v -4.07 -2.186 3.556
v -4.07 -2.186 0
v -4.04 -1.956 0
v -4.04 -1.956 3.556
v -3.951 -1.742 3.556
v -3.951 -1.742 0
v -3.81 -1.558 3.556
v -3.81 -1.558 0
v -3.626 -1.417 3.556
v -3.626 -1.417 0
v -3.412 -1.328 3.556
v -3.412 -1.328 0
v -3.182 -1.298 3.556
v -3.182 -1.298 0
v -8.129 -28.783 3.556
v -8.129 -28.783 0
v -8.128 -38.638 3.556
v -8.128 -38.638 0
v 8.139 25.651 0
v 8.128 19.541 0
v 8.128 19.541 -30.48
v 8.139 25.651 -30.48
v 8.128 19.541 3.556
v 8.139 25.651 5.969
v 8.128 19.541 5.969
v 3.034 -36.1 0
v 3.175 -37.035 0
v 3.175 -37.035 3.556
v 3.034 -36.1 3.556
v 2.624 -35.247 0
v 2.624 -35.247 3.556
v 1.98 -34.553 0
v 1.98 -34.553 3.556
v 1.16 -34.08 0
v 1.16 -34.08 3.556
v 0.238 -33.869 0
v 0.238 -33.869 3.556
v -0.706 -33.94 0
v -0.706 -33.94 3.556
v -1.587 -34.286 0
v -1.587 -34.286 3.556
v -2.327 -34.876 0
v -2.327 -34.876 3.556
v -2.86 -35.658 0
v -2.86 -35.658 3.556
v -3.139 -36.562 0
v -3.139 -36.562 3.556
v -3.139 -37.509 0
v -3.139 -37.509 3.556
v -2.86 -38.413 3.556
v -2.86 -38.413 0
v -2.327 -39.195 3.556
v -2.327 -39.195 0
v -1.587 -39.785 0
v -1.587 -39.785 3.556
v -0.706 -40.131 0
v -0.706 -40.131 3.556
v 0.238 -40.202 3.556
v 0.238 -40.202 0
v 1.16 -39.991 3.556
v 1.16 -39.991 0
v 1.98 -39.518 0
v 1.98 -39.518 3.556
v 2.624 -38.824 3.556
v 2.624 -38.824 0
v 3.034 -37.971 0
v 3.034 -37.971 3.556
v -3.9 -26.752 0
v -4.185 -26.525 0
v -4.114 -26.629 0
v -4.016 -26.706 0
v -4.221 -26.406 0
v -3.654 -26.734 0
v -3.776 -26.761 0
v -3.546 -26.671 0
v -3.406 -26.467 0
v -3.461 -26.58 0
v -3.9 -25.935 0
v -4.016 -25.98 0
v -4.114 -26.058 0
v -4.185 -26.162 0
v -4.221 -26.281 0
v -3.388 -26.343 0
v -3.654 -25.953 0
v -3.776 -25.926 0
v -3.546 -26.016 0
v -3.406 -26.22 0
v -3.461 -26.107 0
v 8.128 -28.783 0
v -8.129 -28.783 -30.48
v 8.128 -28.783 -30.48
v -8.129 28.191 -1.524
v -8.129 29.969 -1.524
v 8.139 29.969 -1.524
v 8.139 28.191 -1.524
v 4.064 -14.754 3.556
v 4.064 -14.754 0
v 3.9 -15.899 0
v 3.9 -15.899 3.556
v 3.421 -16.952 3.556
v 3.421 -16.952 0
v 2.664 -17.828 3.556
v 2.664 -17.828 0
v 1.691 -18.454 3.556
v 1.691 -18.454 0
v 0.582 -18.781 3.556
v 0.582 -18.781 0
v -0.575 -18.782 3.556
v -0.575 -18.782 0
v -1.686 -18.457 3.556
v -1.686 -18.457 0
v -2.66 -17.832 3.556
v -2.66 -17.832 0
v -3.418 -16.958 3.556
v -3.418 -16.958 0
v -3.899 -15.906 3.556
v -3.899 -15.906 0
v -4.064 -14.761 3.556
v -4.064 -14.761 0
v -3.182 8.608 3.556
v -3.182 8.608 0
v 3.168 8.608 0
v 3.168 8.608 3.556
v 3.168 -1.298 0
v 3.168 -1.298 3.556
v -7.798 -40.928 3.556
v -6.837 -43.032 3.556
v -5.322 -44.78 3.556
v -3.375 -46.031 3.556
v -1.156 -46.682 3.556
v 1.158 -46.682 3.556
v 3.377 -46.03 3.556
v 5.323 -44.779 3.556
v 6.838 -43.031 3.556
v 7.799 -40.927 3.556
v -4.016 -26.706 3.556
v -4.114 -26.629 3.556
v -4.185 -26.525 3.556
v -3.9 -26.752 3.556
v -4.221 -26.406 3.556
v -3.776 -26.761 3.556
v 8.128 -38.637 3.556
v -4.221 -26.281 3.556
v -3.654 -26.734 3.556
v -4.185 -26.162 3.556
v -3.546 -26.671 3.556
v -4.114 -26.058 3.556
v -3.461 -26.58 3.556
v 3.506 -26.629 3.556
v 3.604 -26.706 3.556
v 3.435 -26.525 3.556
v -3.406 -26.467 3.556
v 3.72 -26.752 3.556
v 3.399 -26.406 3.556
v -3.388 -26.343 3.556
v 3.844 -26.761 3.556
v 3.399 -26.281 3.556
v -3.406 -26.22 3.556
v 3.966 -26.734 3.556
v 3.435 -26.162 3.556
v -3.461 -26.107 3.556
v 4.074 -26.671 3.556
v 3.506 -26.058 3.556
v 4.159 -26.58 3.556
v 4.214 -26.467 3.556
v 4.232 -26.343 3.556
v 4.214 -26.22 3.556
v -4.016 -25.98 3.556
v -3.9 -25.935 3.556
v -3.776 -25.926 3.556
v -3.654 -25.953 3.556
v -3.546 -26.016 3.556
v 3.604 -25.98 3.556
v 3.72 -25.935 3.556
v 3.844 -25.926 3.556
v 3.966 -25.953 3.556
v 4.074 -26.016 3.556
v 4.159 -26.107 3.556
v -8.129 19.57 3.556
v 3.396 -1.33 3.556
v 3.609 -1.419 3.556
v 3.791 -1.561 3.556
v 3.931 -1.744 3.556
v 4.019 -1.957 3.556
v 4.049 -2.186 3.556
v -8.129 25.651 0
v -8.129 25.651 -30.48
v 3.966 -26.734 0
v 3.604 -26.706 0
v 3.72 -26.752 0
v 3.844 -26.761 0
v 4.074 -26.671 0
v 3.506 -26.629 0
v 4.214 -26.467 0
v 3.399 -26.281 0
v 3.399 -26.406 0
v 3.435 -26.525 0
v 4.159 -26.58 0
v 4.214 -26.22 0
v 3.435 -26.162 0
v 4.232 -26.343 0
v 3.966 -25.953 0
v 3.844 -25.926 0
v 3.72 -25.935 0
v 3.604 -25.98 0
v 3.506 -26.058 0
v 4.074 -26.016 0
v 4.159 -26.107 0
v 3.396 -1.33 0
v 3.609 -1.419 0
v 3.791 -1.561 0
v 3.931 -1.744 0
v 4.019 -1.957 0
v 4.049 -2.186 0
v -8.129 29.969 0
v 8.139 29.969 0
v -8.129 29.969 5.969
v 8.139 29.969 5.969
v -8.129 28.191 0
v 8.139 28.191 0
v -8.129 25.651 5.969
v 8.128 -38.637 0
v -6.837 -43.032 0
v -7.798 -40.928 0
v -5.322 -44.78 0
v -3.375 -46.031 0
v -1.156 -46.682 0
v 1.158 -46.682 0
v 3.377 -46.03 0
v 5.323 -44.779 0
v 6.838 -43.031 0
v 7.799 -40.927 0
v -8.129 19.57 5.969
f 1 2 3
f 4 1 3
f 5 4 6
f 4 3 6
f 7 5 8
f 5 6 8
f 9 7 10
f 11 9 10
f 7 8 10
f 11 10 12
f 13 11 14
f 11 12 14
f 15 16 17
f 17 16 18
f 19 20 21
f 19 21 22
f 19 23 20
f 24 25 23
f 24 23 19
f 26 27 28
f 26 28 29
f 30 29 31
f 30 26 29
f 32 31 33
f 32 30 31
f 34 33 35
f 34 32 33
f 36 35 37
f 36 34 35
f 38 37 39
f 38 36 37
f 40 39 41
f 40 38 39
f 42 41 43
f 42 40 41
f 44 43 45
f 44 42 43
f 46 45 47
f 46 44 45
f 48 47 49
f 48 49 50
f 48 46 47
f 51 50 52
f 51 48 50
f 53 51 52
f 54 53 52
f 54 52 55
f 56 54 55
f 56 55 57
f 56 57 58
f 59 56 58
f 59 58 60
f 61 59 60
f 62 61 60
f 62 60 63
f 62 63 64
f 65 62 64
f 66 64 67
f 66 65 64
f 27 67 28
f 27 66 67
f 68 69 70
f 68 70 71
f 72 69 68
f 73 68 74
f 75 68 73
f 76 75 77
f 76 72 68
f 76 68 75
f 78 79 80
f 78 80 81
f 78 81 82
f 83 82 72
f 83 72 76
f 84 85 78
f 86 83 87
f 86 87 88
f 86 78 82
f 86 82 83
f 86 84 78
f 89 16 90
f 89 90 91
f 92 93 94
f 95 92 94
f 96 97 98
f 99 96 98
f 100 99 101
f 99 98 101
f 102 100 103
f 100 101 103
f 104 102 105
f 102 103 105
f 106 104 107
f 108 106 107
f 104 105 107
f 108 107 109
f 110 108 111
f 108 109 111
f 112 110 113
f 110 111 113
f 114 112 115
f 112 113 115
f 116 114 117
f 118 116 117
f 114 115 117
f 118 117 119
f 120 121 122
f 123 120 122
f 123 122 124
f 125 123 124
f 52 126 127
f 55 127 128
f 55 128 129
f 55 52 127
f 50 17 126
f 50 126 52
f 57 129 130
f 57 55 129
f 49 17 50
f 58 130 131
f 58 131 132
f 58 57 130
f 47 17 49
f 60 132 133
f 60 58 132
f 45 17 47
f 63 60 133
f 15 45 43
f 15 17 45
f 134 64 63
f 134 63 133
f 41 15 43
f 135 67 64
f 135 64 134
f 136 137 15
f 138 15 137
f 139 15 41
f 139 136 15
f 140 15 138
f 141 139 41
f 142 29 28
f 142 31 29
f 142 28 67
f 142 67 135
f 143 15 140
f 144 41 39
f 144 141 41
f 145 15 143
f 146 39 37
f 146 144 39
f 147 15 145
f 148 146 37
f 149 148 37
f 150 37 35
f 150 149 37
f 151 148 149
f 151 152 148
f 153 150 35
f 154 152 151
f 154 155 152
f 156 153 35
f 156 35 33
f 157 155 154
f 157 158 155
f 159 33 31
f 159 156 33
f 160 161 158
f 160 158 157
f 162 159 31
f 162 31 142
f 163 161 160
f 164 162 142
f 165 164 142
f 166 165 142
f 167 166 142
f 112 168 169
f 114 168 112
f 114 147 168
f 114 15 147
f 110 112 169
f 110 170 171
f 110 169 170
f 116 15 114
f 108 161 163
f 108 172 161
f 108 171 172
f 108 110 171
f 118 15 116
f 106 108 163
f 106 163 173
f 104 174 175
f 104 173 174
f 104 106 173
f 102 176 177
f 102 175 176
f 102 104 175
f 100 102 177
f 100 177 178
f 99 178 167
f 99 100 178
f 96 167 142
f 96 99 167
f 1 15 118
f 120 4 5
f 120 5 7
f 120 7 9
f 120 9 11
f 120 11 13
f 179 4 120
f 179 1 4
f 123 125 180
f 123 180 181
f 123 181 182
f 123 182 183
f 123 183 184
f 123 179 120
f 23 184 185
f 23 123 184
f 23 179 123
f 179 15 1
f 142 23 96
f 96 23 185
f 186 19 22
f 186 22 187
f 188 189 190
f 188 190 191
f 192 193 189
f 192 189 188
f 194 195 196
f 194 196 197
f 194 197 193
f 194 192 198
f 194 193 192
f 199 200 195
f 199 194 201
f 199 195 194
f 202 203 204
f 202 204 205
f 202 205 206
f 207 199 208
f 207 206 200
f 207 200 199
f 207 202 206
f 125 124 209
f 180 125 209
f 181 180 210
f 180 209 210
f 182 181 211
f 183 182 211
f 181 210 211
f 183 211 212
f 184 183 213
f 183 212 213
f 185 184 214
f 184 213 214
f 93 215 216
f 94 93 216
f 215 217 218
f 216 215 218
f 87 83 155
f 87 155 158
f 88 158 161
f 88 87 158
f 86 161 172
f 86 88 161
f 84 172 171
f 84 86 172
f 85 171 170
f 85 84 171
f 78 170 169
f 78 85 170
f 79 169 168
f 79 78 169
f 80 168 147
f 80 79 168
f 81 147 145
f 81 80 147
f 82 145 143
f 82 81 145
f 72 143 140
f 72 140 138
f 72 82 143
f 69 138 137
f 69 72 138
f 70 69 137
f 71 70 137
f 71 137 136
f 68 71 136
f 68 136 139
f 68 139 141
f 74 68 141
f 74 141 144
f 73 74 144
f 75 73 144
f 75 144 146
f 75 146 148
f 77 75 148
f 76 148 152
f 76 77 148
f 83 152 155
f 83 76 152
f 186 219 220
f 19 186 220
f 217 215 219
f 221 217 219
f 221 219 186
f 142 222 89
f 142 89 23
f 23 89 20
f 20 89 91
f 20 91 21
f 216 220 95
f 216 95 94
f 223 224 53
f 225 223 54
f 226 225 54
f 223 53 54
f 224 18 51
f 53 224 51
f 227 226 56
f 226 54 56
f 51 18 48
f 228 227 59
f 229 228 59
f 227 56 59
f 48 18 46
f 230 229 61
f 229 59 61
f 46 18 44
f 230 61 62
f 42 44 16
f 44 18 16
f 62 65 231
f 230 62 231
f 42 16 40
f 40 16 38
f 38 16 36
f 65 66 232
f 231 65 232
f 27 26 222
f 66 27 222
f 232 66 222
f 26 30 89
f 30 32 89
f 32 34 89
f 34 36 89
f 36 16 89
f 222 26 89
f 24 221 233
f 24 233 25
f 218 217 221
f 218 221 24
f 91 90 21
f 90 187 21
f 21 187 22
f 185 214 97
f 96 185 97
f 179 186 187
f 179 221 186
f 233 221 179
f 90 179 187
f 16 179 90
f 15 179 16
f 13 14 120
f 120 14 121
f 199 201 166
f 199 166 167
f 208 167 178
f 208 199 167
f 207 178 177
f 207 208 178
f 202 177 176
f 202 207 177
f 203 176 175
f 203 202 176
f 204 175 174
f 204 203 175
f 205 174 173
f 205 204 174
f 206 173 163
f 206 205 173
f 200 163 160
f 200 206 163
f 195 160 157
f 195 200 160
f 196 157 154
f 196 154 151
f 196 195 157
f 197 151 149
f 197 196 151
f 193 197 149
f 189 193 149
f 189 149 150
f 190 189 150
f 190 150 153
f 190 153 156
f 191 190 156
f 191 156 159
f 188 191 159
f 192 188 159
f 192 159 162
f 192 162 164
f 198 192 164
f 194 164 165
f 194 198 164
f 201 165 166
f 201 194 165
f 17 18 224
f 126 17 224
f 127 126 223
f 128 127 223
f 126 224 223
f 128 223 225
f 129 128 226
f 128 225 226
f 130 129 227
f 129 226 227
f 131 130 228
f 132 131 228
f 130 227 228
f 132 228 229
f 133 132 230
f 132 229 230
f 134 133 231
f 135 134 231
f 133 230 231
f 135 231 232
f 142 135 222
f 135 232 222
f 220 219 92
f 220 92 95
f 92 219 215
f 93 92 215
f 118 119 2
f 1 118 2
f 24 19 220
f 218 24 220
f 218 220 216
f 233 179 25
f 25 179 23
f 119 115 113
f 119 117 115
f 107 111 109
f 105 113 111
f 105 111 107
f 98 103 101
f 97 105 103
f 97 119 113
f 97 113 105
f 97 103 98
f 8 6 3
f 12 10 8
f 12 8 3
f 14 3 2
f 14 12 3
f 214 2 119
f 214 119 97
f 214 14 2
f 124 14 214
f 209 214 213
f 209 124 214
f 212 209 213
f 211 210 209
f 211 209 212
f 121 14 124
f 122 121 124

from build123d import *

# Parameters (mm, degrees)
F0_R     = 0.4191
F0_R_2   = 3.175
F1_DEPTH = 3.556
F0_W     = 16.2684546465
F0_H     = 2.54
F0_H_2   = 1.778
F2_DEPTH = 5.969
F3_DEPTH = 1.524
F4_DEPTH = 30.48


with BuildPart() as f1:
    # F0 (on Top) → F1 (new body)
    with BuildSketch(Plane.XY):
        Polygon((-8.1289618026, 19.5699129487), (-8.1289618026, -28.7827895308), (8.1284994147, -28.7827895308), (8.1284994147, 19.5406646823), align=None)
        with Locations((-3.8069129527, -26.3434465483)):
            Circle(F0_R, mode=Mode.SUBTRACT)
        with Locations((3.8130870473, -26.3434465483)):
            Circle(F0_R, mode=Mode.SUBTRACT)
        with BuildLine():
            ThreePointArc((4.0638460346, -14.7540253319), (0.0030865228, -18.8226827446), (-4.0641509764, -14.7605010551))
            Line((-4.0641509764, -14.7605010551), (-4.069773258, -2.185850306))
            ThreePointArc((-4.069773258, -2.185850306), (-3.8099907741, -1.5581196008), (-3.1823557791, -1.2981059663))
            Line((-3.1823557791, -1.2981059663), (-3.1823557791, 8.6078940337))
            Line((-3.1823557791, 8.6078940337), (3.1676447176, 8.6078940337))
            Line((3.1676447176, 8.6078940337), (3.1676447176, -1.2981059659))
            ThreePointArc((3.1676447176, -1.2981059659), (3.7912426345, -1.5606685465), (4.0494391018, -2.1860868505))
            Line((4.0494391018, -2.1860868505), (4.0638460346, -14.7540253319))
        make_face(mode=Mode.SUBTRACT)
        with BuildLine():
            Line((-8.1289618026, -28.7827895308), (-8.1275002277, -38.637912922))
            ThreePointArc((-8.1275002501, -38.637912922), (0.0011022648, -46.764707356), (8.1284994371, -38.6367074901))
            Line((8.1284994147, -38.6367074901), (8.1284994147, -28.7827895308))
            Line((8.1284994147, -28.7827895308), (-8.1289618026, -28.7827895308))
        make_face()
        with Locations((0.0004995041, -37.0354612684)):
            Circle(F0_R_2, mode=Mode.SUBTRACT)
    extrude(amount=F1_DEPTH)

    # F0 (on Top) → F2 (join)
    with BuildSketch(Plane.XY):
        Polygon((-8.1289618026, 25.6512917549), (-8.1289618026, 19.5699129487), (8.1284994147, 19.5406646823), (8.1394928439, 25.6512917549), align=None)
        with Locations((0.0052655206, 26.9212917549)):
            Rectangle(F0_W, F0_H)
        with Locations((0.0052655206, 29.0802917549)):
            Rectangle(F0_W, F0_H_2)
    extrude(amount=F2_DEPTH)

    # F0 (on Top) → F3 (join)
    with BuildSketch(Plane.XY):
        with Locations((0.0052655206, 29.0802917549)):
            Rectangle(F0_W, F0_H_2)
    extrude(amount=-F3_DEPTH)

    # F0 (on Top) → F4 (join)
    with BuildSketch(Plane.XY):
        Polygon((-8.1289618026, 19.5699129487), (-8.1289618026, -28.7827895308), (8.1284994147, -28.7827895308), (8.1284994147, 19.5406646823), align=None)
        with Locations((-3.8069129527, -26.3434465483)):
            Circle(F0_R, mode=Mode.SUBTRACT)
        with Locations((3.8130870473, -26.3434465483)):
            Circle(F0_R, mode=Mode.SUBTRACT)
        with BuildLine():
            ThreePointArc((4.0638460346, -14.7540253319), (0.0030865228, -18.8226827446), (-4.0641509764, -14.7605010551))
            Line((-4.0641509764, -14.7605010551), (-4.069773258, -2.185850306))
            ThreePointArc((-4.069773258, -2.185850306), (-3.8099907741, -1.5581196008), (-3.1823557791, -1.2981059663))
            Line((-3.1823557791, -1.2981059663), (-3.1823557791, 8.6078940337))
            Line((-3.1823557791, 8.6078940337), (3.1676447176, 8.6078940337))
            Line((3.1676447176, 8.6078940337), (3.1676447176, -1.2981059659))
            ThreePointArc((3.1676447176, -1.2981059659), (3.7912426345, -1.5606685465), (4.0494391018, -2.1860868505))
            Line((4.0494391018, -2.1860868505), (4.0638460346, -14.7540253319))
        make_face(mode=Mode.SUBTRACT)
        with BuildLine():
            Line((-4.069773258, -2.185850306), (-4.0641509764, -14.7605010551))
            ThreePointArc((-4.0641509764, -14.7605010551), (0.0030865228, -18.8226827446), (4.0638460346, -14.7540253319))
            Line((4.0638460346, -14.7540253319), (4.0494391018, -2.1860868505))
            ThreePointArc((4.0494391018, -2.1860868505), (3.7912426345, -1.5606685465), (3.1676447176, -1.2981059659))
            Line((3.1676447176, -1.2981059659), (3.1676447176, 8.6078940337))
            Line((3.1676447176, 8.6078940337), (-3.1823557791, 8.6078940337))
            Line((-3.1823557791, 8.6078940337), (-3.1823557791, -1.2981059663))
            ThreePointArc((-3.1823557791, -1.2981059663), (-3.8099907741, -1.5581196008), (-4.069773258, -2.185850306))
        make_face()
        Polygon((-8.1289618026, 25.6512917549), (-8.1289618026, 19.5699129487), (8.1284994147, 19.5406646823), (8.1394928439, 25.6512917549), align=None)
        with Locations((3.8130870473, -26.3434465483)):
            Circle(F0_R)
        with Locations((-3.8069129527, -26.3434465483)):
            Circle(F0_R)
    extrude(amount=-F4_DEPTH)


solid = f1.part
